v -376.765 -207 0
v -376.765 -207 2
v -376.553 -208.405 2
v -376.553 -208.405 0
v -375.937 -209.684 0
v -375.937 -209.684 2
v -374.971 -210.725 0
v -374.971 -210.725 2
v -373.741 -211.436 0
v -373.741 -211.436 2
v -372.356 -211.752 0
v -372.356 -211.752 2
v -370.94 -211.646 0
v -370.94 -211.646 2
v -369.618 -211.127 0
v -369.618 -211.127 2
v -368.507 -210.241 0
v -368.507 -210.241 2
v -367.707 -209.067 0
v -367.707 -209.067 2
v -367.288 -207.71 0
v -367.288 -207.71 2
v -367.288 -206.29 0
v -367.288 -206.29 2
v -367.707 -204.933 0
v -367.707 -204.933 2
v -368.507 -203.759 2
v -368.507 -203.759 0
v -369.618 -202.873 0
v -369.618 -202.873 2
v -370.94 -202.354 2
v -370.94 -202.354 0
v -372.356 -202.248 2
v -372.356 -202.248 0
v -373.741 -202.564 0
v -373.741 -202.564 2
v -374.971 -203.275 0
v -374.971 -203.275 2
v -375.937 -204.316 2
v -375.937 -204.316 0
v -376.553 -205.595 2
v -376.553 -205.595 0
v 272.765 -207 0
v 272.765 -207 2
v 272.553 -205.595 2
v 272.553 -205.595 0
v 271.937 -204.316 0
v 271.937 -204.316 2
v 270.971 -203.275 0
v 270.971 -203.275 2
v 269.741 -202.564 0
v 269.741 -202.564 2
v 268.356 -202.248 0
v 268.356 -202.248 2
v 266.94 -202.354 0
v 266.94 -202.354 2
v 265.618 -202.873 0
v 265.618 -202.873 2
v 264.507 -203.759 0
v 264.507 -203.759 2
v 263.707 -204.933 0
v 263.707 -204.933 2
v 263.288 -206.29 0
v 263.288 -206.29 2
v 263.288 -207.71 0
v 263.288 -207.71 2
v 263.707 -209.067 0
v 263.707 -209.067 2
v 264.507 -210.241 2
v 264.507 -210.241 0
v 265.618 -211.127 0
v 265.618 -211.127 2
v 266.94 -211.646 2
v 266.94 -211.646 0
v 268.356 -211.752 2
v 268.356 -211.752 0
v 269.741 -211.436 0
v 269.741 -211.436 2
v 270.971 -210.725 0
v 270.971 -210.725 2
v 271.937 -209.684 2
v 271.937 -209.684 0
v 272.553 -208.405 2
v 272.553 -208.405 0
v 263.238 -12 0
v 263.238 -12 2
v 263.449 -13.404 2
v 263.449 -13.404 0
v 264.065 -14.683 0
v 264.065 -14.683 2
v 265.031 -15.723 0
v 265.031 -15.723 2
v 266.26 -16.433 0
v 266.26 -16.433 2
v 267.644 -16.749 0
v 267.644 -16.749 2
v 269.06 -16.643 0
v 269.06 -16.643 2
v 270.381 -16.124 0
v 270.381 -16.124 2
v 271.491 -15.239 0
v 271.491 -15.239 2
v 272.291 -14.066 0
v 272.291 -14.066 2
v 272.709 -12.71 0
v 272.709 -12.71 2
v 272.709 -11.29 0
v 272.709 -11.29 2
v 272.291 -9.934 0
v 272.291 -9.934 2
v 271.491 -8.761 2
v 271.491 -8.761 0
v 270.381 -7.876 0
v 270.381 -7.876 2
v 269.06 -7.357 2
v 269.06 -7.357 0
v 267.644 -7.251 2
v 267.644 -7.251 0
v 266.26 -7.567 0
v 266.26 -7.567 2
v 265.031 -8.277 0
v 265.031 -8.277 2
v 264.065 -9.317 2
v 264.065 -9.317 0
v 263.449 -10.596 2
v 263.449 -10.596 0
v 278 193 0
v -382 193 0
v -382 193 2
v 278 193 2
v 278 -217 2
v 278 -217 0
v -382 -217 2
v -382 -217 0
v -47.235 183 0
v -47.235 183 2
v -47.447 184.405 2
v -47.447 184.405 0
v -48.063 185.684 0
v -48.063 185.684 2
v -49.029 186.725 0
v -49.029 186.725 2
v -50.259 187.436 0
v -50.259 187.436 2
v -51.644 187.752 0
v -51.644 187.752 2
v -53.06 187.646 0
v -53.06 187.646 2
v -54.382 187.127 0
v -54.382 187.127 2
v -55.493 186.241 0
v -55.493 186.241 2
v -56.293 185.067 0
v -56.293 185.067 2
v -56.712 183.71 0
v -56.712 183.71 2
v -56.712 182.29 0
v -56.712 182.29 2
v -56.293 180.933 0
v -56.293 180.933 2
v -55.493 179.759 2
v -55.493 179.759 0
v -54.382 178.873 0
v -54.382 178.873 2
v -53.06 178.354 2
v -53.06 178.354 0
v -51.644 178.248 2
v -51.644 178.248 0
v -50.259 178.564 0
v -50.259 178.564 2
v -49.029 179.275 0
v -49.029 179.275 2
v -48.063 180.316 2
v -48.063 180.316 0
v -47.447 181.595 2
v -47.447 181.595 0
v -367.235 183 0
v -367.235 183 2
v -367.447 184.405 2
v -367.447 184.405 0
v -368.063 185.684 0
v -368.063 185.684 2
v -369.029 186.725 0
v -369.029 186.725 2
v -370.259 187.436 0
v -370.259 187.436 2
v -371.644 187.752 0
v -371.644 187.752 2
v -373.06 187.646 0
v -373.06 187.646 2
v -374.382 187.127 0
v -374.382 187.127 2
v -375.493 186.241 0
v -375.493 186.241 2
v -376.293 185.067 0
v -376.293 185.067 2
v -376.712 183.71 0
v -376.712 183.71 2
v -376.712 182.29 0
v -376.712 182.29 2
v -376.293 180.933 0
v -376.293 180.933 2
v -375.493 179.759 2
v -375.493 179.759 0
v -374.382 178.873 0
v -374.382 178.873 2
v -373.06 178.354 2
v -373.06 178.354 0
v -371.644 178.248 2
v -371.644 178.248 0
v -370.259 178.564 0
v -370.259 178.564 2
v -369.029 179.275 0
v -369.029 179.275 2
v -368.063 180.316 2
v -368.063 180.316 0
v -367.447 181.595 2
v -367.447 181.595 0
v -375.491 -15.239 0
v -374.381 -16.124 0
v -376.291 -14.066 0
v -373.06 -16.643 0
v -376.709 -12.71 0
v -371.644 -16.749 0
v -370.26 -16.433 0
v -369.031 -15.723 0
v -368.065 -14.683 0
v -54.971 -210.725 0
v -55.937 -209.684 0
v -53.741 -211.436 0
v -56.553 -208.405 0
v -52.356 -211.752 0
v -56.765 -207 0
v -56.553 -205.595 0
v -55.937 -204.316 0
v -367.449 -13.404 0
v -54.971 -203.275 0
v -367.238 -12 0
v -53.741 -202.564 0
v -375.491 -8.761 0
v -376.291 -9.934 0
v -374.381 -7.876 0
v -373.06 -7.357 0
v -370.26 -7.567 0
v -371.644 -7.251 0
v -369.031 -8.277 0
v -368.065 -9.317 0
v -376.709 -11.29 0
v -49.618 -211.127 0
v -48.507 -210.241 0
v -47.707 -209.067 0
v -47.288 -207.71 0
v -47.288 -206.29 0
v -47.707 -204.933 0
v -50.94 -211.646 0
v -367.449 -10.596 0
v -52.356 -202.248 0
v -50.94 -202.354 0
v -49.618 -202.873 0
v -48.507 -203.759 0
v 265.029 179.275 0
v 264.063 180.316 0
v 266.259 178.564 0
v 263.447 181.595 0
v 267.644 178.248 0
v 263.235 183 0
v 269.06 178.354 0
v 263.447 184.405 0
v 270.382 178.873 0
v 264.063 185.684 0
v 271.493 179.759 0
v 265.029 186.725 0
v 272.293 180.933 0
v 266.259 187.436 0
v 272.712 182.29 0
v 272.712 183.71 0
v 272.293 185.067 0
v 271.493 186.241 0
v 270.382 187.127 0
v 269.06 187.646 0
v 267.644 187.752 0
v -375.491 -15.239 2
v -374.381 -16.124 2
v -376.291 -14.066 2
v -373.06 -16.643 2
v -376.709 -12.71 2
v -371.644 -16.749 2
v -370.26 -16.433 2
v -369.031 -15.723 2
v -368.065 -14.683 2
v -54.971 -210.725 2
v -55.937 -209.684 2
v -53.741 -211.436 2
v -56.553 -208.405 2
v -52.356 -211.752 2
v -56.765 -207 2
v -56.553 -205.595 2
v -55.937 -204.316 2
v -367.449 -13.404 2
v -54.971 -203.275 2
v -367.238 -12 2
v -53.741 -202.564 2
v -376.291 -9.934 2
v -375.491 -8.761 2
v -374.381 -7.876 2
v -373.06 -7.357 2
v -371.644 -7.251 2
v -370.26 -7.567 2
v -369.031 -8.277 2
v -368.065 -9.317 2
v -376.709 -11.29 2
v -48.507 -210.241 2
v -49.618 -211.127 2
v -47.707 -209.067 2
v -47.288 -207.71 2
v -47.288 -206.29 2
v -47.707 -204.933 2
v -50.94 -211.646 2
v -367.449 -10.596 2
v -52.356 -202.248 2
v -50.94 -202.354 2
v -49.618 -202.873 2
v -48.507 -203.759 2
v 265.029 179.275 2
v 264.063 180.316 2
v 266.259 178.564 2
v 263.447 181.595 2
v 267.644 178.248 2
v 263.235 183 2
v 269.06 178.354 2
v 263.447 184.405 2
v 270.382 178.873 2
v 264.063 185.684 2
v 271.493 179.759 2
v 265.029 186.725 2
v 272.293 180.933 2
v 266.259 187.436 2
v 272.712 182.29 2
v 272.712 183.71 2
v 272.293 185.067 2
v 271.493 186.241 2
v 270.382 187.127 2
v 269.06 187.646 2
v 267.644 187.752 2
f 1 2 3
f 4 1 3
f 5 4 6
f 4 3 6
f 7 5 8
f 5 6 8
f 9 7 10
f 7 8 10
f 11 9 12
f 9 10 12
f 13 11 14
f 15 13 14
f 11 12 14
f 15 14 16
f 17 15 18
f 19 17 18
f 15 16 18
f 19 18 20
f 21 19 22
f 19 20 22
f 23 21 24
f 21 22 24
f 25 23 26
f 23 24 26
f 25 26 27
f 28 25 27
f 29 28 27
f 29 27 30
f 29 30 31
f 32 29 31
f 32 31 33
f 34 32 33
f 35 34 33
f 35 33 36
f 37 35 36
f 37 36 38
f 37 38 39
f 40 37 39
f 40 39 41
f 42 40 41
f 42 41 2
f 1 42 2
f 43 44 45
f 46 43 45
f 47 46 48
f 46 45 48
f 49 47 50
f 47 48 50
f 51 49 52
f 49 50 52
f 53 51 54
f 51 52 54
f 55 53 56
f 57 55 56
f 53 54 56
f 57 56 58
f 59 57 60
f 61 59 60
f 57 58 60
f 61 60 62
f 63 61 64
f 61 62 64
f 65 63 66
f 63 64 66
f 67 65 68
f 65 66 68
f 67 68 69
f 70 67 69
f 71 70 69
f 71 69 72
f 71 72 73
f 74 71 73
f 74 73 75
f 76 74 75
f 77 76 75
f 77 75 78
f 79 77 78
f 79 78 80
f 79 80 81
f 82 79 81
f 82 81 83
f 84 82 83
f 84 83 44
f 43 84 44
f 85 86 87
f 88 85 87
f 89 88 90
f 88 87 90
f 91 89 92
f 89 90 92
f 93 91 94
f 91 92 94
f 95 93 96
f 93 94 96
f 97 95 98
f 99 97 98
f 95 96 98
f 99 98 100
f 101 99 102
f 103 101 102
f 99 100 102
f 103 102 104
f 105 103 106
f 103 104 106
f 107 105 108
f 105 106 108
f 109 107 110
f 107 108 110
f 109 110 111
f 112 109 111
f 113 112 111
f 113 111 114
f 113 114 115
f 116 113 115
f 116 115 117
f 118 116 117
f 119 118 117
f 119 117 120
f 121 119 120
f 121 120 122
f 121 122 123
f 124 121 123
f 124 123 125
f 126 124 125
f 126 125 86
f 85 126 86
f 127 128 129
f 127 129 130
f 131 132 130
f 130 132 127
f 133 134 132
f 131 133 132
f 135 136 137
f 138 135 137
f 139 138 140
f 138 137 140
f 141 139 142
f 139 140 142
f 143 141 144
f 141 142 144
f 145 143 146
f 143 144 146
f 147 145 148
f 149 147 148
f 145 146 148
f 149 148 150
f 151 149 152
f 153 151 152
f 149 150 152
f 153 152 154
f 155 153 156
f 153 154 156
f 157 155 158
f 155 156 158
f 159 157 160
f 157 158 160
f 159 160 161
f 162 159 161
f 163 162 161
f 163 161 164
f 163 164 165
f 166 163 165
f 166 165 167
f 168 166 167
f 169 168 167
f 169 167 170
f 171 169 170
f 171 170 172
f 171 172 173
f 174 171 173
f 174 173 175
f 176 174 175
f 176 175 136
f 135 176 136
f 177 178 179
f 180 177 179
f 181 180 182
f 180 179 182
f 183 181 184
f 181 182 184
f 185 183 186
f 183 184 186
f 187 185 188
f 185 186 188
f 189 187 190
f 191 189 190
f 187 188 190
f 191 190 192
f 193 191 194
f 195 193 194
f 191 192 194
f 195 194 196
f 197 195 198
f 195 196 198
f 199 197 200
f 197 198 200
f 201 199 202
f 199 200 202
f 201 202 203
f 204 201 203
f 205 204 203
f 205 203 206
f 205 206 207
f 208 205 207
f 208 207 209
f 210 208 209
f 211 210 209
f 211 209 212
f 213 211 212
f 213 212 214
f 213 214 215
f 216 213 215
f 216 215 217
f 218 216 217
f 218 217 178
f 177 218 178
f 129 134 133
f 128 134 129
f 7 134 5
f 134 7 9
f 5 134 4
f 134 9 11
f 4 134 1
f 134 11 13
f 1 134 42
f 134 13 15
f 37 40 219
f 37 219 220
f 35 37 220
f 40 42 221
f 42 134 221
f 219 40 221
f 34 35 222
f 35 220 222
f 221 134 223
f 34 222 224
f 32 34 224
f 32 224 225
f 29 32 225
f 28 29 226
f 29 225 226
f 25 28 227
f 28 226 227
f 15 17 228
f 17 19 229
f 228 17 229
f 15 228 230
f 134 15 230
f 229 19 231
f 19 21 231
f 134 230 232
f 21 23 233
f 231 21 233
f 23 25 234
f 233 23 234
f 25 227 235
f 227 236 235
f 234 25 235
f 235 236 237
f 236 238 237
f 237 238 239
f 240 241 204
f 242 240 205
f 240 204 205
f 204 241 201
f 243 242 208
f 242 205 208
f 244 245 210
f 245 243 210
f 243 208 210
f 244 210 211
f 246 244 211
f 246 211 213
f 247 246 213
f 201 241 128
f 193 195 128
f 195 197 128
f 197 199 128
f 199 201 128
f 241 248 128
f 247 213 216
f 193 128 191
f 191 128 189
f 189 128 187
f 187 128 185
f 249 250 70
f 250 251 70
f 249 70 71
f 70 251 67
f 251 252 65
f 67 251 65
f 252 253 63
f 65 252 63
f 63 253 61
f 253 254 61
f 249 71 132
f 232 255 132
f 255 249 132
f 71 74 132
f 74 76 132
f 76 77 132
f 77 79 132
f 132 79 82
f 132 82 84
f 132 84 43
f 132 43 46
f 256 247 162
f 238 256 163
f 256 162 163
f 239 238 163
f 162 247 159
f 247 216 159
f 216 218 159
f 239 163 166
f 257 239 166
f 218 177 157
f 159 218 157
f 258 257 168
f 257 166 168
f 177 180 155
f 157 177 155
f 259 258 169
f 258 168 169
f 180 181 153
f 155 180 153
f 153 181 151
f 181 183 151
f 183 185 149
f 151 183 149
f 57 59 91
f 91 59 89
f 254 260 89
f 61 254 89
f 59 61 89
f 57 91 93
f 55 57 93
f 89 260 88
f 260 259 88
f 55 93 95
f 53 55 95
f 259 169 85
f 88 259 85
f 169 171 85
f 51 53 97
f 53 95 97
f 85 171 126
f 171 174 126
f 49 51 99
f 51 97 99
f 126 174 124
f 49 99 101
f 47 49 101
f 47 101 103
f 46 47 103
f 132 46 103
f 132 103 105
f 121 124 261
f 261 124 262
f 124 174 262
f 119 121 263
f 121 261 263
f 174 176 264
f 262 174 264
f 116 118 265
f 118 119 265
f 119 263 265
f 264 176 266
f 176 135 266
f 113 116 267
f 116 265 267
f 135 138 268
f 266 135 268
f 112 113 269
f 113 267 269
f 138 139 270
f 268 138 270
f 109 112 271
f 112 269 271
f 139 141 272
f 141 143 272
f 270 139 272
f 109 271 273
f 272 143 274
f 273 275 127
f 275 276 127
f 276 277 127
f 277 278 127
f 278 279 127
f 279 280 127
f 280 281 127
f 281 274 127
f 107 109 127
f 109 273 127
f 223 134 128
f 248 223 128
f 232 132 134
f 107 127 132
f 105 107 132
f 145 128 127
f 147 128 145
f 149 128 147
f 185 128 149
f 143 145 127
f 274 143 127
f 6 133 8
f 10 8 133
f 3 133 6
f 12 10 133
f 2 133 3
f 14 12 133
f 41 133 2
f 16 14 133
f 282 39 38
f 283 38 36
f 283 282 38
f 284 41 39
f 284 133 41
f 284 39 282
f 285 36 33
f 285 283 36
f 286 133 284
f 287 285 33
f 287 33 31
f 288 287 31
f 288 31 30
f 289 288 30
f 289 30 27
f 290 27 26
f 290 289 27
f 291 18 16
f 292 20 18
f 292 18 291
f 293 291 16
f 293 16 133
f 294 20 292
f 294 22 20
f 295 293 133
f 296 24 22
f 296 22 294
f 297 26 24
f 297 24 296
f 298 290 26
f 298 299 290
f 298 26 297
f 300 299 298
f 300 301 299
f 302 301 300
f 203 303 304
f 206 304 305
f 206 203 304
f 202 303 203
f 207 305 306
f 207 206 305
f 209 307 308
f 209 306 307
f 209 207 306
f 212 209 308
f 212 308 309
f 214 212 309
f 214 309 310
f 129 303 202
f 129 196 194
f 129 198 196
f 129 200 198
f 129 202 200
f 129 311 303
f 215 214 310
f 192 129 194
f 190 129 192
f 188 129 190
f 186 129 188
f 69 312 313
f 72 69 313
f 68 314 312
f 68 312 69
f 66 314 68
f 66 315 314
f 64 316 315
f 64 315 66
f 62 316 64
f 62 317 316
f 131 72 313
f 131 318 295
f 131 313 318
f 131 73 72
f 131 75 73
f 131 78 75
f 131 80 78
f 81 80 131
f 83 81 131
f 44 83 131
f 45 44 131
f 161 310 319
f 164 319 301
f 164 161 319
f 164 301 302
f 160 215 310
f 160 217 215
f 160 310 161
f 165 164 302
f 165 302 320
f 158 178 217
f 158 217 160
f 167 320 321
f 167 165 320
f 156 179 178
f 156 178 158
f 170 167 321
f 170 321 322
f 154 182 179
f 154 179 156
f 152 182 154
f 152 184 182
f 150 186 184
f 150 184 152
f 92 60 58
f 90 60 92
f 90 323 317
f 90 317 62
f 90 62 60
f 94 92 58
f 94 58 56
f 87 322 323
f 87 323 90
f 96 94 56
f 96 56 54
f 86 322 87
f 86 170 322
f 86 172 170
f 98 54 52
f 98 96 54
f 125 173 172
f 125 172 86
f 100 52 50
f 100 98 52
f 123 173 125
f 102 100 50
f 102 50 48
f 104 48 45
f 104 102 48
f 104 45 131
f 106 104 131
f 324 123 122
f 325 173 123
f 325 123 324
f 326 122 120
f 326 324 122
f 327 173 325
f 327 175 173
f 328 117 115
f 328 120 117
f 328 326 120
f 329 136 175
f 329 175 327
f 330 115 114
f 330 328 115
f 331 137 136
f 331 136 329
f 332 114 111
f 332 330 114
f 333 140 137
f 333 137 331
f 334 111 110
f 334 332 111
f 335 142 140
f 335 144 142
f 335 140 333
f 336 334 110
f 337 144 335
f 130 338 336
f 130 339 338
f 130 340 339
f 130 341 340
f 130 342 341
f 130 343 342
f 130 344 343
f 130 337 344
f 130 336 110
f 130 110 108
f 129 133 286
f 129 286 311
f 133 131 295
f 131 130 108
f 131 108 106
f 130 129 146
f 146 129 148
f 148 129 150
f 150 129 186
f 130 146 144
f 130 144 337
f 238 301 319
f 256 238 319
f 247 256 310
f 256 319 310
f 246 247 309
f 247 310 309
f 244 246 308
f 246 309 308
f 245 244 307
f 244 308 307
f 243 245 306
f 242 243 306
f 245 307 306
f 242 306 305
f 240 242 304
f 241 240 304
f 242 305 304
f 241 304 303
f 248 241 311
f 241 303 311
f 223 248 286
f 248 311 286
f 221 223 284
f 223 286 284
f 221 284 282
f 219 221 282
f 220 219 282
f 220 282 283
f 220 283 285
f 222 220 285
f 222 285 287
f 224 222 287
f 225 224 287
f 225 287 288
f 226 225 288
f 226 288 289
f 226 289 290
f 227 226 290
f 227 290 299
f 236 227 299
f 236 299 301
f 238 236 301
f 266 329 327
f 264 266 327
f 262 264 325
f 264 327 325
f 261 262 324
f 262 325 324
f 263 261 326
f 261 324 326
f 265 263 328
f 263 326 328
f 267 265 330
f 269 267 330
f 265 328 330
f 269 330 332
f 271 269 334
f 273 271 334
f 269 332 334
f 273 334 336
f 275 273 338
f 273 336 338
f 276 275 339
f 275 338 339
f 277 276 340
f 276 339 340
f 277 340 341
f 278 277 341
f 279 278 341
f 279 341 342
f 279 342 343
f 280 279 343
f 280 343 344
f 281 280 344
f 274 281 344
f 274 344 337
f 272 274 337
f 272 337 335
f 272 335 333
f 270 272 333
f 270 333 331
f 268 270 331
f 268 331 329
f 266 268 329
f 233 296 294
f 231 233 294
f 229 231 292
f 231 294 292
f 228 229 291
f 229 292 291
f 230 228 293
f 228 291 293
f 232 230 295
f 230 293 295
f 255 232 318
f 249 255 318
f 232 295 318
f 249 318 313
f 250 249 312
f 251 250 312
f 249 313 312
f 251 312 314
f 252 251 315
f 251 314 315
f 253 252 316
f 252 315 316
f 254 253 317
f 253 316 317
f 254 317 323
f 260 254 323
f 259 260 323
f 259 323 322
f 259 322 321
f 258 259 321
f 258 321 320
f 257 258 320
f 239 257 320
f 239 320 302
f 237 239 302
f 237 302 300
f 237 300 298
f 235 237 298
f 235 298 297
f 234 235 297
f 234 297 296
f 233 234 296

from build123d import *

# Parameters (mm, degrees)
CROQUIS1_W              = 660
CROQUIS1_H              = 410
SALIENTE_EXTRUIR1_DEPTH = 2
CROQUIS2_R              = 4.765
CROQUIS2_R_2            = 4.7625
CORTAR_EXTRUIR2_DEPTH   = 10


with BuildPart() as part:
    # Croquis1 → Saliente-Extruir1 (new body)
    with BuildSketch(Plane.XY):
        with Locations((-52, -12)):
            Rectangle(CROQUIS1_W, CROQUIS1_H)
    extrude(amount=SALIENTE_EXTRUIR1_DEPTH)

    # Croquis2 → Cortar-Extruir2 (cut)
    with BuildSketch(Plane.XY.offset(2)):
        with Locations((-372, 183)):
            Circle(CROQUIS2_R)
        with Locations(Location((268, 183, 0), (0, 0, 180))):
            Circle(CROQUIS2_R)
        with Locations((268, -207)):
            Circle(CROQUIS2_R)
        with Locations(Location((-372, -207, 0), (0, 0, 180))):
            Circle(CROQUIS2_R)
        with Locations((-372, -12)):
            Circle(CROQUIS2_R_2)
        with Locations(Location((268, -12, 0), (0, 0, 180))):
            Circle(CROQUIS2_R_2)
        with Locations((-52, 183)):
            Circle(CROQUIS2_R)
        with Locations(Location((-52, -207, 0), (0, 0, 180))):
            Circle(CROQUIS2_R)
    extrude(amount=-CORTAR_EXTRUIR2_DEPTH, mode=Mode.SUBTRACT)


solid = part.part
